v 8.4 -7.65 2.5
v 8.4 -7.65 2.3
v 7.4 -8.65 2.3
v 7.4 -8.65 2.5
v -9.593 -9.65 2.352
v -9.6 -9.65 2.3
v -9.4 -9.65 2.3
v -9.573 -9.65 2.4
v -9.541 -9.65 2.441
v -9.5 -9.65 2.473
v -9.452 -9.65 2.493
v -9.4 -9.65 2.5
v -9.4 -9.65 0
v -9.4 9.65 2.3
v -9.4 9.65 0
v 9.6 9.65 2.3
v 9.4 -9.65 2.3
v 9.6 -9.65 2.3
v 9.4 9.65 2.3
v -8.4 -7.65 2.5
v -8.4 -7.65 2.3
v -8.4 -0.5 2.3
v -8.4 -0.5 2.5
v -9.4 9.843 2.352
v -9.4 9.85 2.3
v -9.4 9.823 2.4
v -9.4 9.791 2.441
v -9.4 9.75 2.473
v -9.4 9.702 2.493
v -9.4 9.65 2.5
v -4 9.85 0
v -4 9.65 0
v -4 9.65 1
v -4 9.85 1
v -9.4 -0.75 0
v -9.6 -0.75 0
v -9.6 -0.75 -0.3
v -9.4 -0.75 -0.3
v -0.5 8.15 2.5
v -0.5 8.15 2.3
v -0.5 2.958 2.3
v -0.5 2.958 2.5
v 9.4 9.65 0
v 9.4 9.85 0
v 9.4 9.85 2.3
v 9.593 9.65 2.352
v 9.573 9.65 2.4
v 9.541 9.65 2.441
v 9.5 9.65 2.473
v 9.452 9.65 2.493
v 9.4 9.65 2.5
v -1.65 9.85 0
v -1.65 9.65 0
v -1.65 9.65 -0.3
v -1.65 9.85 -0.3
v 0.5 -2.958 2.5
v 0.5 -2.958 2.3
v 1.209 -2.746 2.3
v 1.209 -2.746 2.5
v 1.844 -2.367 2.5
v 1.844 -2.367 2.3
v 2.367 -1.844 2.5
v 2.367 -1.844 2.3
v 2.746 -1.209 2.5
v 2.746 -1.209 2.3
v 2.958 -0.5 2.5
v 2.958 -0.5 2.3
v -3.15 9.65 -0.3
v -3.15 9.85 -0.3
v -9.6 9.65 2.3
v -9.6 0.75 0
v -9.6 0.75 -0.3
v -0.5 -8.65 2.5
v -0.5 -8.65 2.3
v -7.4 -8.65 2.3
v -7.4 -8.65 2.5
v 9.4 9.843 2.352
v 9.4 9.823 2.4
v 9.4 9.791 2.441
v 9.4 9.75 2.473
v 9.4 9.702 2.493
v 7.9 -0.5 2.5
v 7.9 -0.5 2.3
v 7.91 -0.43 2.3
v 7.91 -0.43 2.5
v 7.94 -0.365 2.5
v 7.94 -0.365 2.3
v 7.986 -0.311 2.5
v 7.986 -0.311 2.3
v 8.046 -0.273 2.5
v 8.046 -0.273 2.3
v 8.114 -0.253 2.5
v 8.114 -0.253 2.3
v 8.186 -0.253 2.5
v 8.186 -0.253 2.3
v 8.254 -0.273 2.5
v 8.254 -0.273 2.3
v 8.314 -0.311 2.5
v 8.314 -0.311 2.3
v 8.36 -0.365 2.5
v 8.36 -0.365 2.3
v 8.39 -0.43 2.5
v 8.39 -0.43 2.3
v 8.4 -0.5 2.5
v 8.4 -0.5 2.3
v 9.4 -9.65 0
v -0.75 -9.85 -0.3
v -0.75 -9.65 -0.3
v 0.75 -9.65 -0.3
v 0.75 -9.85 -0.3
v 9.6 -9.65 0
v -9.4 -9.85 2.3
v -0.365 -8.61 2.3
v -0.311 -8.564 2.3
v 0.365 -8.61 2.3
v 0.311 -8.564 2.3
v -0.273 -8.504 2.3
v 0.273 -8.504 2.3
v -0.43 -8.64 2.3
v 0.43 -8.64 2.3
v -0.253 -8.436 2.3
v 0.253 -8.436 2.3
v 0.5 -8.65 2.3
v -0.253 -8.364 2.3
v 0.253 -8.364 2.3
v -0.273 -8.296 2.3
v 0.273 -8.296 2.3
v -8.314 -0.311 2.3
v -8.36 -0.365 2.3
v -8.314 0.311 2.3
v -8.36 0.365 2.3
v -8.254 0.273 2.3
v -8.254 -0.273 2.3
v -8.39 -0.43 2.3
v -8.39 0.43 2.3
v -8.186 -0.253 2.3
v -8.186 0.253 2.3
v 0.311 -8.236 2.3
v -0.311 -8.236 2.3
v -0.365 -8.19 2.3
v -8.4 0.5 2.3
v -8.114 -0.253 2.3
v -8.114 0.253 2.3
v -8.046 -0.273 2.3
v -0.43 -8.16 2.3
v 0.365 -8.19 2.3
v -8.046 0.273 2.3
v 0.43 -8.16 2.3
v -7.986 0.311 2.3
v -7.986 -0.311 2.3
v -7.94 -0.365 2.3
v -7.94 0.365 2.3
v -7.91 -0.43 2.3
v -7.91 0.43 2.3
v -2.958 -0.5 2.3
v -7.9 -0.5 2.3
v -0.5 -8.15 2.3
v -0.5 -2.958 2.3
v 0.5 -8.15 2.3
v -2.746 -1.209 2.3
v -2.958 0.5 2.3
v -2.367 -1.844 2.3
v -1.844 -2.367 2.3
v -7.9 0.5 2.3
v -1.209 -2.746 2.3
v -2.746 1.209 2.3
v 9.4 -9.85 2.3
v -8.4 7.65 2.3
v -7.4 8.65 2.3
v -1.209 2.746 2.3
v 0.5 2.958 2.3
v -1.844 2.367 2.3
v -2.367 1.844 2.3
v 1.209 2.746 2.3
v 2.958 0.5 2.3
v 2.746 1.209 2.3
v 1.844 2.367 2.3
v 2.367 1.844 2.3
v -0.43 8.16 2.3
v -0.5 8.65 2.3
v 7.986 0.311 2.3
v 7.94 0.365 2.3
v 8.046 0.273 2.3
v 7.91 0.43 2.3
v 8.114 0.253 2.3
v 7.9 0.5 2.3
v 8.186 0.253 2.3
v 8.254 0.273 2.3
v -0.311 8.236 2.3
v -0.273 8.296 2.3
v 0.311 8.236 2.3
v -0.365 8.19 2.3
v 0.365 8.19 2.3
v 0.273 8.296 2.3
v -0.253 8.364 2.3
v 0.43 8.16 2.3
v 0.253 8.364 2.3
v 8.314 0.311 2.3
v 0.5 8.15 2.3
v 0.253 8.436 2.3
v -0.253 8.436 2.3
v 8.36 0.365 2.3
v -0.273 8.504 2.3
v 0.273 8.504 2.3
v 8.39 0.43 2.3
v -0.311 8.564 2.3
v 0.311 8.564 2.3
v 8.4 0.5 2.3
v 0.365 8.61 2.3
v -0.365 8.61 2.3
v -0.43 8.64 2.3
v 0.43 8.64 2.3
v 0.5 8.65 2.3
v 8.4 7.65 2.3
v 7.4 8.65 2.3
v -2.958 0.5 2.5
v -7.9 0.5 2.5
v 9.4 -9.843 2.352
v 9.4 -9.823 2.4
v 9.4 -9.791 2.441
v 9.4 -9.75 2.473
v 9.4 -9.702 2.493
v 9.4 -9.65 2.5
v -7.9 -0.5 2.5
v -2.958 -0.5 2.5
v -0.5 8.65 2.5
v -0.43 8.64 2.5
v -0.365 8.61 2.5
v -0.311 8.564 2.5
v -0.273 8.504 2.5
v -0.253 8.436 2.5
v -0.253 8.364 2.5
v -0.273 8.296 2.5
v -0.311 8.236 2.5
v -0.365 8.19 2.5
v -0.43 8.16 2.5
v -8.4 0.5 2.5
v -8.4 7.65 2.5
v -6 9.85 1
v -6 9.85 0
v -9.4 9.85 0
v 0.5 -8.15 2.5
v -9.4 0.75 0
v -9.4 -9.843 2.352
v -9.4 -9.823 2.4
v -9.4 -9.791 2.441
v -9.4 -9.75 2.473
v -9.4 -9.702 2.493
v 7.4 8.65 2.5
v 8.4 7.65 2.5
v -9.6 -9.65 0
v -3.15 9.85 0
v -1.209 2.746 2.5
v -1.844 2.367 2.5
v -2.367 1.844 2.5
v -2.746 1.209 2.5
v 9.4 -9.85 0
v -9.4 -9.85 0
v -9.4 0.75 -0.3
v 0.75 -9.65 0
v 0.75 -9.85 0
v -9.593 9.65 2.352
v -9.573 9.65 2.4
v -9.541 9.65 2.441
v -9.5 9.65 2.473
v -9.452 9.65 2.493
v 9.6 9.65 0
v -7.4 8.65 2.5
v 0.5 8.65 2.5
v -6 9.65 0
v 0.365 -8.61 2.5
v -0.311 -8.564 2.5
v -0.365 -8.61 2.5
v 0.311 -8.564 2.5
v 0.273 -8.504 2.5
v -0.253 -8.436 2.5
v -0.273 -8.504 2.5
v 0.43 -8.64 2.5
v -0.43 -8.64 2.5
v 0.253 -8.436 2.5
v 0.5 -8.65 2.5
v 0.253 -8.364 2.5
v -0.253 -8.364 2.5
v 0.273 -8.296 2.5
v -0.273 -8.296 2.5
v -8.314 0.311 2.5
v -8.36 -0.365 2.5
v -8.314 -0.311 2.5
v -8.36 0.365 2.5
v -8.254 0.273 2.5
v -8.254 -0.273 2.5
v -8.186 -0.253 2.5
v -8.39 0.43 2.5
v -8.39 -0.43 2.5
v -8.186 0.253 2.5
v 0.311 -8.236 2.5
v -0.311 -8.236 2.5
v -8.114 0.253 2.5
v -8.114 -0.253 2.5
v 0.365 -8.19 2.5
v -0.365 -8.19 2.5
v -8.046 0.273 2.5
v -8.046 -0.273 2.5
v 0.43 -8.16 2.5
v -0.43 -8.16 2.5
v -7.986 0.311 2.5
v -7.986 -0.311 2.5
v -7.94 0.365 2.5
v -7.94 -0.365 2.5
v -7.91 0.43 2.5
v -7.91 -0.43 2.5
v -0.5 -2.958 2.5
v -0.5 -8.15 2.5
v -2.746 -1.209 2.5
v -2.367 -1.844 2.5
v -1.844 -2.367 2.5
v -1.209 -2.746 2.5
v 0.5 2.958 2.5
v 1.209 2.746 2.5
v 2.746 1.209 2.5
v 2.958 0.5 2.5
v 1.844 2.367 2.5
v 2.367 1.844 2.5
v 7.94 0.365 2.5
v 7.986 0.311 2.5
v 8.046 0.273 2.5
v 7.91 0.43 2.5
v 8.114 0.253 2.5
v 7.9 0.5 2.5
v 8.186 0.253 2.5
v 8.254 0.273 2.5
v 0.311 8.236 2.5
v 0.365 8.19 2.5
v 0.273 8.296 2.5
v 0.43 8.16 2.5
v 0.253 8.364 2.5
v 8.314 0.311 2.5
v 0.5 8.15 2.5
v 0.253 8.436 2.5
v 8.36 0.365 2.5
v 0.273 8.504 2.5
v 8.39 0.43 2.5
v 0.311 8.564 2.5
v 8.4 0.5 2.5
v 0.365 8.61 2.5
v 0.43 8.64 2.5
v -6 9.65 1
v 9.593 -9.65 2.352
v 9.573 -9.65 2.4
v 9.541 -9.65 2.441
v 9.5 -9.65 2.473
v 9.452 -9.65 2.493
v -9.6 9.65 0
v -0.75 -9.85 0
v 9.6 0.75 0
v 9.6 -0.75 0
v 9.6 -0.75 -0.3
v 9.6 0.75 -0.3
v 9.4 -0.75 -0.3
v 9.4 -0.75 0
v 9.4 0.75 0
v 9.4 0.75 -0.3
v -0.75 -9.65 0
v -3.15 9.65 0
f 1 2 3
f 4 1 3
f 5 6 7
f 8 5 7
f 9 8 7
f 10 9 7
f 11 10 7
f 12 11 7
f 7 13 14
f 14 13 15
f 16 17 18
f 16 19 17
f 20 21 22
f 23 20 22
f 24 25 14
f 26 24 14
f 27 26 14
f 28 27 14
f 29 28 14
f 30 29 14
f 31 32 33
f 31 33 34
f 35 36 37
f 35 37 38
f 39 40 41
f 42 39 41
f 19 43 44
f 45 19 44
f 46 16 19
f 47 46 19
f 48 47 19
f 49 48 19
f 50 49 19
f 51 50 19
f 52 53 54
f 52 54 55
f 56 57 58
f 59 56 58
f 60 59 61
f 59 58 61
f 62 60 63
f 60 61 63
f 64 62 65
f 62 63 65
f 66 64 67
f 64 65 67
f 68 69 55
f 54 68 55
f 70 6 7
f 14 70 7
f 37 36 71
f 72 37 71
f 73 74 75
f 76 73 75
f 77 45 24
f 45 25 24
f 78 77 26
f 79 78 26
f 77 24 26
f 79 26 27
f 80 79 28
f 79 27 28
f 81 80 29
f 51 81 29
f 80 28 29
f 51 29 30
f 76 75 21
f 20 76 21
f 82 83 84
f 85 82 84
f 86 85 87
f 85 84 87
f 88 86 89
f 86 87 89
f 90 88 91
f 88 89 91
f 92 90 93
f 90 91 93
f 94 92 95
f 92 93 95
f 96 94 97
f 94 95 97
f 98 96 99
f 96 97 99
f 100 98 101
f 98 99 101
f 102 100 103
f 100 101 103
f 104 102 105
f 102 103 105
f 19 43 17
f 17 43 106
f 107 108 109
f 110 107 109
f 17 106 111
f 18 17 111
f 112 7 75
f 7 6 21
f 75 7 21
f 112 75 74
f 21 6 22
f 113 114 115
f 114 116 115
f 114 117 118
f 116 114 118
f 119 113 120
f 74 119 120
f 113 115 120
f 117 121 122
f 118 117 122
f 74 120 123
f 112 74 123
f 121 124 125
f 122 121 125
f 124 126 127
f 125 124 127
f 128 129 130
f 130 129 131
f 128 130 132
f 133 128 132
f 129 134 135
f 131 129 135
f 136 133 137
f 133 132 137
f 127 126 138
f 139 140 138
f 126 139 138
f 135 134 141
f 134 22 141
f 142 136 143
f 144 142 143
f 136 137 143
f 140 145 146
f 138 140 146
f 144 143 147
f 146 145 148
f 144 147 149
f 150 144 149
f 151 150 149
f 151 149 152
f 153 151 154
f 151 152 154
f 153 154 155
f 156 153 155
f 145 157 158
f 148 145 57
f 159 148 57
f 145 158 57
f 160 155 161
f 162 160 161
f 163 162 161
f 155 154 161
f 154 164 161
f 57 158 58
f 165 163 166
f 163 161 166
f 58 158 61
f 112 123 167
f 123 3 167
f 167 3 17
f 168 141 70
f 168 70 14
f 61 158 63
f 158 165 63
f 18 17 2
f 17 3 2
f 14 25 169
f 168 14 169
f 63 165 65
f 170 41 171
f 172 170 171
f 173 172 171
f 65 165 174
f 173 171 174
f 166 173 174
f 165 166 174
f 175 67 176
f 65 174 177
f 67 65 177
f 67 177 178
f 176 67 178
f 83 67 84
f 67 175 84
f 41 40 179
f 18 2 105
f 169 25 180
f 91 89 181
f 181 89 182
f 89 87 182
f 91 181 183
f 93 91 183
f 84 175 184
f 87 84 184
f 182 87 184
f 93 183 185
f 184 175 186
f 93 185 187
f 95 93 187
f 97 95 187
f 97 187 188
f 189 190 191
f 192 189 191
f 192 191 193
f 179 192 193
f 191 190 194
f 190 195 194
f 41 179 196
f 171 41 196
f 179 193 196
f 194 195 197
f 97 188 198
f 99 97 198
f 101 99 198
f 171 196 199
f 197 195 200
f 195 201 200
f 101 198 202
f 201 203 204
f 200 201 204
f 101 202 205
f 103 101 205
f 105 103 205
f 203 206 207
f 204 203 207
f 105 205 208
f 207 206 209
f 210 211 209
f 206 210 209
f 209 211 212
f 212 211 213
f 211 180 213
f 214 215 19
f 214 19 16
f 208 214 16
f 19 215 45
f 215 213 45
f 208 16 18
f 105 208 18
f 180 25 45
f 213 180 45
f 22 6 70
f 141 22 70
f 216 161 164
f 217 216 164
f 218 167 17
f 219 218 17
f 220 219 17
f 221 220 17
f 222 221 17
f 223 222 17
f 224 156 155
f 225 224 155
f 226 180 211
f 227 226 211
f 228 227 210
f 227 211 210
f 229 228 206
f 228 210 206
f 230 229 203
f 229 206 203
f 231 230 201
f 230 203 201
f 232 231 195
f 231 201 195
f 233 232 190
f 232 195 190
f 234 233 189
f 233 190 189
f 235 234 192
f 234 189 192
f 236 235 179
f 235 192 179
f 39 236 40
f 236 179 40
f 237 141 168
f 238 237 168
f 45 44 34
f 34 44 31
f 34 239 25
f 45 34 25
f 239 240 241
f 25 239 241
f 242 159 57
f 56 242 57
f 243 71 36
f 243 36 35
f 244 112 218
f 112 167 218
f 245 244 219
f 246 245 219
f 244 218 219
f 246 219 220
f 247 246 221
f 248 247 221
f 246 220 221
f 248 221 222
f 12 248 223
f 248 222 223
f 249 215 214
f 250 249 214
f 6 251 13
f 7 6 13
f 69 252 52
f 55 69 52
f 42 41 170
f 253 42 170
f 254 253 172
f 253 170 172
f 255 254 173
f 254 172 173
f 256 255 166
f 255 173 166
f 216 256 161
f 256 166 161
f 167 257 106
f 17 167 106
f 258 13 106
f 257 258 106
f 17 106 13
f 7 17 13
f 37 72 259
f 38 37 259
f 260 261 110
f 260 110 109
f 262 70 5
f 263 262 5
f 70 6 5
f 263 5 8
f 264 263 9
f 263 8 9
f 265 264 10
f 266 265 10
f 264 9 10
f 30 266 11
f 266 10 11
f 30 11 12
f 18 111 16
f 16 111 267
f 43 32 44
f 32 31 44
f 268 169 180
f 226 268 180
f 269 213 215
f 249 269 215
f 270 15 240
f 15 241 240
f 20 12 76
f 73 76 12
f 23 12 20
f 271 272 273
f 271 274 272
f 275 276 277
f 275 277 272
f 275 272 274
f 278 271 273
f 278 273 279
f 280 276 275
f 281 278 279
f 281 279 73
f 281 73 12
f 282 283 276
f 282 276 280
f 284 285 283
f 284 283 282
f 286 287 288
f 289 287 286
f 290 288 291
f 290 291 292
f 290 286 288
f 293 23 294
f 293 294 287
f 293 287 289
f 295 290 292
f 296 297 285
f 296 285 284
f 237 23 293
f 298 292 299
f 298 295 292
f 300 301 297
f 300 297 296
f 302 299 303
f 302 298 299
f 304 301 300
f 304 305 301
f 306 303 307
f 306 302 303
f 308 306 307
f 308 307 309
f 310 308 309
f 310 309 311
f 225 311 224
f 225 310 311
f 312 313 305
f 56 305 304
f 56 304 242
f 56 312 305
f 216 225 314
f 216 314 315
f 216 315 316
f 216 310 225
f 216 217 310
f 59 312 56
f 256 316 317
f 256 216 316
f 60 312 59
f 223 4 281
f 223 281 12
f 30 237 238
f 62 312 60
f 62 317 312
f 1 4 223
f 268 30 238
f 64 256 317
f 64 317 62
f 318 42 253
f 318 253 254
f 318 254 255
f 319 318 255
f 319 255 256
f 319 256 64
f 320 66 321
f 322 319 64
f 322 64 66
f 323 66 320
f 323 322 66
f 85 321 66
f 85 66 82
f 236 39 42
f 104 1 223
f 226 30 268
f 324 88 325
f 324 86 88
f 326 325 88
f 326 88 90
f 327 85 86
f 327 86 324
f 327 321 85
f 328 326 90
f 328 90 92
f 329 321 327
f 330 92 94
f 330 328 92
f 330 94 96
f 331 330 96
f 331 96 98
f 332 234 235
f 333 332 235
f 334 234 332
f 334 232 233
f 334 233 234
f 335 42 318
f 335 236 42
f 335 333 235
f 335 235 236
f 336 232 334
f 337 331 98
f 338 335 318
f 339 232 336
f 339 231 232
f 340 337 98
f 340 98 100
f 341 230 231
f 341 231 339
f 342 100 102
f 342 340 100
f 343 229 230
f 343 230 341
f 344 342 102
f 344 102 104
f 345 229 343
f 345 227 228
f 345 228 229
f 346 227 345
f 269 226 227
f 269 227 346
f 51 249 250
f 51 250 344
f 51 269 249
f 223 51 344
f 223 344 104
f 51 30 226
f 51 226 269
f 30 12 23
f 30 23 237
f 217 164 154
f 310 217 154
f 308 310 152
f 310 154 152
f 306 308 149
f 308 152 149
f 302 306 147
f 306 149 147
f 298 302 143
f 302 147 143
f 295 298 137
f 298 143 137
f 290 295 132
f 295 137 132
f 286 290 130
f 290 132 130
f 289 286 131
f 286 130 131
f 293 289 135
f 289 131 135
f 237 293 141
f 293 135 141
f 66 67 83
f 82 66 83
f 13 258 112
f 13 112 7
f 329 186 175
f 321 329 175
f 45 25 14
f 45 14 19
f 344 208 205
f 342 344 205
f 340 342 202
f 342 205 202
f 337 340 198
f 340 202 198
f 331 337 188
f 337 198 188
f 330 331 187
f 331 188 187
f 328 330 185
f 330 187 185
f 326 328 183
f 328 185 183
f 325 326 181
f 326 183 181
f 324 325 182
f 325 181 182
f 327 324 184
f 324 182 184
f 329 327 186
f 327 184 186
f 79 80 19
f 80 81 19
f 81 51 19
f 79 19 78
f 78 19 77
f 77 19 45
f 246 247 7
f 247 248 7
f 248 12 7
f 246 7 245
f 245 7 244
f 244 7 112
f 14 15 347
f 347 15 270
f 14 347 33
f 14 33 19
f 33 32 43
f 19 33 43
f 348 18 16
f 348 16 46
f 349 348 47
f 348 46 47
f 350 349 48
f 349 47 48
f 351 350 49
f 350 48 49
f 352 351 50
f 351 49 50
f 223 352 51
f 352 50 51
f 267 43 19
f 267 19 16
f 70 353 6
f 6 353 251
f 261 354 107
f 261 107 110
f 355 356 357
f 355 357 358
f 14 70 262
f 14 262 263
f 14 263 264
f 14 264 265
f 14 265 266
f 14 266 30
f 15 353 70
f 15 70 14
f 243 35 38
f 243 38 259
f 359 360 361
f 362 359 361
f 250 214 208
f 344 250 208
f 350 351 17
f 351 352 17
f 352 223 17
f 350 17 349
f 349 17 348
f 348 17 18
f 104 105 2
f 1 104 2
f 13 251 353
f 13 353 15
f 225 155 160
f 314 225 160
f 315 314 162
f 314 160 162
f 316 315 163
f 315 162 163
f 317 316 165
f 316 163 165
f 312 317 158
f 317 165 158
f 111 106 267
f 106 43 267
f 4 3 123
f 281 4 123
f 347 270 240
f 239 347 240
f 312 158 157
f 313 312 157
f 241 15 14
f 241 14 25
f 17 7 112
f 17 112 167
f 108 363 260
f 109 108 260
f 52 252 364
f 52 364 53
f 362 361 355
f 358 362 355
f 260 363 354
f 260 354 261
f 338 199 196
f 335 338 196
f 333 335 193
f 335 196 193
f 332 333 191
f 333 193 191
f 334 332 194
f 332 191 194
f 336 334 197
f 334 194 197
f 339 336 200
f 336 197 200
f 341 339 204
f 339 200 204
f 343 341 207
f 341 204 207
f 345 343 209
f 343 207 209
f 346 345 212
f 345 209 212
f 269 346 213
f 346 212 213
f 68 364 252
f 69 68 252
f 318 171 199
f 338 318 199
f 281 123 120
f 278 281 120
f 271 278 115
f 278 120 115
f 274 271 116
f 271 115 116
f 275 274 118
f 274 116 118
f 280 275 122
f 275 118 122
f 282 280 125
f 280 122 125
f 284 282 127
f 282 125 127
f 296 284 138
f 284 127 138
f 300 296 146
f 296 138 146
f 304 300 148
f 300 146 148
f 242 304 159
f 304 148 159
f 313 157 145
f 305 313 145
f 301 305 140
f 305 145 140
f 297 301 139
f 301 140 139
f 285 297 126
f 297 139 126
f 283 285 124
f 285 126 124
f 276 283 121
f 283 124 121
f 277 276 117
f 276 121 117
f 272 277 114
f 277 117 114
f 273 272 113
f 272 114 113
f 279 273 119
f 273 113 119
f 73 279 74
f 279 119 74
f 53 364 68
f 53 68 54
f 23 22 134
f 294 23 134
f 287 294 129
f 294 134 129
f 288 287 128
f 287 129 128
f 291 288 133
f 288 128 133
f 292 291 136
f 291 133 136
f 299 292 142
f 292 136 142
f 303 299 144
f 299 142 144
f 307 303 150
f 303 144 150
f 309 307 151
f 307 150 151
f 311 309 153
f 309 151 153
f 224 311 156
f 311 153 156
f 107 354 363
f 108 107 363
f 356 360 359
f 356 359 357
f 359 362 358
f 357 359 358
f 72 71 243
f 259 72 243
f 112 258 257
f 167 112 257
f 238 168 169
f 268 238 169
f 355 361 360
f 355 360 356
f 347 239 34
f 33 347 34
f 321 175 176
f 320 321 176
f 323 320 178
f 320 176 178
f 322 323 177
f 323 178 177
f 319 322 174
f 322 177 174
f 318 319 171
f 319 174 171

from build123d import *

# Parameters (mm, degrees)
F1_START = 2.3
F0_W     = 8.65
F0_H     = 0.2
F0_W_2   = 1.5
F0_W_3   = 0.2
F0_H_2   = 8.9
F0_H_3   = 1.5
F0_W_4   = 11.05
F0_W_5   = 0.85
F0_W_6   = 2
F0_W_7   = 3.4
F1_DEPTH = 0.2
F2_DEPTH = 2.3
F3_DEPTH = 0.3
F4_DEPTH = 1
F5_R     = 0.1999


# Not quite as in the source:
# - a fillet or chamfer is up to 0.001 mm smaller than in the source, because OpenCascade refuses the exact size
# - ends of sketch curves that miss each other by under 0.0002 mm in the source are joined


with BuildPart() as f1:
    # F0 (on Top) → F1 (new body)
    with BuildSketch(Plane.XY.offset(F1_START)):
        Polygon((-6, 9.65), (-9.4, 9.65), (-9.4, 0.75), (-9.4, -0.75), (-9.4, -9.65), (-0.75, -9.65), (0.75, -9.65), (9.4, -9.65), (9.4, -0.75), (9.4, 0.75), (9.4, 9.65), (-1.65, 9.65), (-3.15, 9.65), (-4, 9.65), align=None)
        with BuildLine():
            Line((-0.5, -8.65), (-7.4, -8.65))
            Line((-7.4, -8.65), (-8.4, -7.65))
            Line((-8.4, -7.65), (-8.4, -0.5))
            ThreePointArc((-8.4, -0.5), (-8.15, -0.25), (-7.9, -0.5))
            Line((-7.9, -0.5), (-2.95804, -0.5))
            ThreePointArc((-2.95804, -0.5), (-2.1213203436, -2.1213203436), (-0.4999999822, -2.9580398946))
            Line((-0.4999999822, -2.9580398946), (-0.5, -8.15))
            ThreePointArc((-0.5, -8.15), (-0.25, -8.4), (-0.5, -8.65))
        make_face(mode=Mode.SUBTRACT)
        with BuildLine():
            Line((8.4, -7.65), (7.4, -8.65))
            Line((7.4, -8.65), (0.5, -8.65))
            ThreePointArc((0.5, -8.65), (0.25, -8.4), (0.5, -8.15))
            Line((0.5, -8.15), (0.5, -2.95804))
            ThreePointArc((0.5, -2.95804), (2.1213203436, -2.1213203436), (2.9580398946, -0.4999999822))
            Line((2.9580398946, -0.4999999822), (7.9, -0.5))
            ThreePointArc((7.9, -0.5), (8.15, -0.25), (8.4, -0.5))
            Line((8.4, -0.5), (8.4, -7.65))
        make_face(mode=Mode.SUBTRACT)
        with BuildLine():
            Line((-8.4, 0.5), (-8.4, 7.65))
            Line((-8.4, 7.65), (-7.4, 8.65))
            Line((-7.4, 8.65), (-0.5, 8.65))
            ThreePointArc((-0.5, 8.65), (-0.25, 8.4), (-0.5, 8.15))
            Line((-0.5, 8.15), (-0.5, 2.95804))
            ThreePointArc((-0.5, 2.95804), (-2.1213203436, 2.1213203436), (-2.9580398946, 0.4999999822))
            Line((-2.9580398946, 0.4999999822), (-7.9, 0.5))
            ThreePointArc((-7.9, 0.5), (-8.15, 0.25), (-8.4, 0.5))
        make_face(mode=Mode.SUBTRACT)
        with BuildLine():
            Line((0.5, 8.65), (7.4, 8.65))
            Line((7.4, 8.65), (8.4, 7.65))
            Line((8.4, 7.65), (8.4, 0.5))
            ThreePointArc((8.4, 0.5), (8.15, 0.25), (7.9, 0.5))
            Line((7.9, 0.5), (2.95804, 0.5))
            ThreePointArc((2.95804, 0.5), (2.1213203436, 2.1213203436), (0.4999999822, 2.9580398946))
            Line((0.4999999822, 2.9580398946), (0.5, 8.15))
            ThreePointArc((0.5, 8.15), (0.25, 8.4), (0.5, 8.65))
        make_face(mode=Mode.SUBTRACT)
        with Locations((-5.075, -9.75)):
            Rectangle(F0_W, F0_H)
        with Locations((0, -9.75)):
            Rectangle(F0_W_2, F0_H)
        with Locations((5.075, -9.75)):
            Rectangle(F0_W, F0_H)
        with Locations((9.5, -5.2)):
            Rectangle(F0_W_3, F0_H_2)
        with Locations((9.5, 0)):
            Rectangle(F0_W_3, F0_H_3)
        with Locations((9.5, 5.2)):
            Rectangle(F0_W_3, F0_H_2)
        with Locations((3.875, 9.75)):
            Rectangle(F0_W_4, F0_H)
        with Locations((-2.4, 9.75)):
            Rectangle(F0_W_2, F0_H)
        with Locations((-3.575, 9.75)):
            Rectangle(F0_W_5, F0_H)
        with Locations((-5, 9.75)):
            Rectangle(F0_W_6, F0_H)
        with Locations((-7.7, 9.75)):
            Rectangle(F0_W_7, F0_H)
        with Locations((-9.5, 5.2)):
            Rectangle(F0_W_3, F0_H_2)
        with Locations((-9.5, 0)):
            Rectangle(F0_W_3, F0_H_3)
        with Locations((-9.5, -5.2)):
            Rectangle(F0_W_3, F0_H_2)
    extrude(amount=F1_DEPTH)

    # F5 (radius 0.2 in the source; OpenCascade refuses exactly that, so slightly less here)
    f5_edges = [f1.edges().sort_by_distance(p)[0] for p in [
        (0, -9.85, 2.5),
        (9.6, 0, 2.5),
        (0, 9.85, 2.5),
        (-9.6, 0, 2.5),
    ]]
    fillet(f5_edges, radius=F5_R)


with BuildPart() as f2:
    # F0 (on Top) → F2 (new body)
    with BuildSketch(Plane.XY):
        with Locations((-5.075, -9.75)):
            Rectangle(F0_W, F0_H)
        with Locations((0, -9.75)):
            Rectangle(F0_W_2, F0_H)
        with Locations((5.075, -9.75)):
            Rectangle(F0_W, F0_H)
    extrude(amount=F2_DEPTH)


with BuildPart() as f2b:
    # F0 (on Top) → F2, piece 2 (new body)
    with BuildSketch(Plane.XY):
        with Locations((9.5, -5.2)):
            Rectangle(F0_W_3, F0_H_2)
        with Locations((9.5, 0)):
            Rectangle(F0_W_3, F0_H_3)
        with Locations((9.5, 5.2)):
            Rectangle(F0_W_3, F0_H_2)
    extrude(amount=F2_DEPTH)


with BuildPart() as f2c:
    # F0 (on Top) → F2, piece 3 (new body)
    with BuildSketch(Plane.XY):
        with Locations((3.875, 9.75)):
            Rectangle(F0_W_4, F0_H)
        with Locations((-2.4, 9.75)):
            Rectangle(F0_W_2, F0_H)
        with Locations((-3.575, 9.75)):
            Rectangle(F0_W_5, F0_H)
        with Locations((-5, 9.75)):
            Rectangle(F0_W_6, F0_H)
        with Locations((-7.7, 9.75)):
            Rectangle(F0_W_7, F0_H)
    extrude(amount=F2_DEPTH)

    # F0 (on Top) → F4 (cut)
    with BuildSketch(Plane.XY):
        with Locations((-5, 9.75)):
            Rectangle(F0_W_6, F0_H)
    extrude(amount=F4_DEPTH, mode=Mode.SUBTRACT)


with BuildPart() as f2d:
    # F0 (on Top) → F2, piece 4 (new body)
    with BuildSketch(Plane.XY):
        with Locations((-9.5, 5.2)):
            Rectangle(F0_W_3, F0_H_2)
        with Locations((-9.5, 0)):
            Rectangle(F0_W_3, F0_H_3)
        with Locations((-9.5, -5.2)):
            Rectangle(F0_W_3, F0_H_2)
    extrude(amount=F2_DEPTH)


with BuildPart() as f3:
    # F0 (on Top) → F3 (new body)
    with BuildSketch(Plane.XY):
        with Locations((9.5, 0)):
            Rectangle(F0_W_3, F0_H_3)
    extrude(amount=-F3_DEPTH)


with BuildPart() as f3b:
    # F0 (on Top) → F3, piece 2 (new body)
    with BuildSketch(Plane.XY):
        with Locations((0, -9.75)):
            Rectangle(F0_W_2, F0_H)
    extrude(amount=-F3_DEPTH)


with BuildPart() as f3c:
    # F0 (on Top) → F3, piece 3 (new body)
    with BuildSketch(Plane.XY):
        with Locations((-9.5, 0)):
            Rectangle(F0_W_3, F0_H_3)
    extrude(amount=-F3_DEPTH)


with BuildPart() as f3d:
    # F0 (on Top) → F3, piece 4 (new body)
    with BuildSketch(Plane.XY):
        with Locations((-2.4, 9.75)):
            Rectangle(F0_W_2, F0_H)
    extrude(amount=-F3_DEPTH)


solid = Compound([f1.part, f2.part, f2b.part, f2c.part, f2d.part, f3.part, f3b.part, f3c.part, f3d.part])
